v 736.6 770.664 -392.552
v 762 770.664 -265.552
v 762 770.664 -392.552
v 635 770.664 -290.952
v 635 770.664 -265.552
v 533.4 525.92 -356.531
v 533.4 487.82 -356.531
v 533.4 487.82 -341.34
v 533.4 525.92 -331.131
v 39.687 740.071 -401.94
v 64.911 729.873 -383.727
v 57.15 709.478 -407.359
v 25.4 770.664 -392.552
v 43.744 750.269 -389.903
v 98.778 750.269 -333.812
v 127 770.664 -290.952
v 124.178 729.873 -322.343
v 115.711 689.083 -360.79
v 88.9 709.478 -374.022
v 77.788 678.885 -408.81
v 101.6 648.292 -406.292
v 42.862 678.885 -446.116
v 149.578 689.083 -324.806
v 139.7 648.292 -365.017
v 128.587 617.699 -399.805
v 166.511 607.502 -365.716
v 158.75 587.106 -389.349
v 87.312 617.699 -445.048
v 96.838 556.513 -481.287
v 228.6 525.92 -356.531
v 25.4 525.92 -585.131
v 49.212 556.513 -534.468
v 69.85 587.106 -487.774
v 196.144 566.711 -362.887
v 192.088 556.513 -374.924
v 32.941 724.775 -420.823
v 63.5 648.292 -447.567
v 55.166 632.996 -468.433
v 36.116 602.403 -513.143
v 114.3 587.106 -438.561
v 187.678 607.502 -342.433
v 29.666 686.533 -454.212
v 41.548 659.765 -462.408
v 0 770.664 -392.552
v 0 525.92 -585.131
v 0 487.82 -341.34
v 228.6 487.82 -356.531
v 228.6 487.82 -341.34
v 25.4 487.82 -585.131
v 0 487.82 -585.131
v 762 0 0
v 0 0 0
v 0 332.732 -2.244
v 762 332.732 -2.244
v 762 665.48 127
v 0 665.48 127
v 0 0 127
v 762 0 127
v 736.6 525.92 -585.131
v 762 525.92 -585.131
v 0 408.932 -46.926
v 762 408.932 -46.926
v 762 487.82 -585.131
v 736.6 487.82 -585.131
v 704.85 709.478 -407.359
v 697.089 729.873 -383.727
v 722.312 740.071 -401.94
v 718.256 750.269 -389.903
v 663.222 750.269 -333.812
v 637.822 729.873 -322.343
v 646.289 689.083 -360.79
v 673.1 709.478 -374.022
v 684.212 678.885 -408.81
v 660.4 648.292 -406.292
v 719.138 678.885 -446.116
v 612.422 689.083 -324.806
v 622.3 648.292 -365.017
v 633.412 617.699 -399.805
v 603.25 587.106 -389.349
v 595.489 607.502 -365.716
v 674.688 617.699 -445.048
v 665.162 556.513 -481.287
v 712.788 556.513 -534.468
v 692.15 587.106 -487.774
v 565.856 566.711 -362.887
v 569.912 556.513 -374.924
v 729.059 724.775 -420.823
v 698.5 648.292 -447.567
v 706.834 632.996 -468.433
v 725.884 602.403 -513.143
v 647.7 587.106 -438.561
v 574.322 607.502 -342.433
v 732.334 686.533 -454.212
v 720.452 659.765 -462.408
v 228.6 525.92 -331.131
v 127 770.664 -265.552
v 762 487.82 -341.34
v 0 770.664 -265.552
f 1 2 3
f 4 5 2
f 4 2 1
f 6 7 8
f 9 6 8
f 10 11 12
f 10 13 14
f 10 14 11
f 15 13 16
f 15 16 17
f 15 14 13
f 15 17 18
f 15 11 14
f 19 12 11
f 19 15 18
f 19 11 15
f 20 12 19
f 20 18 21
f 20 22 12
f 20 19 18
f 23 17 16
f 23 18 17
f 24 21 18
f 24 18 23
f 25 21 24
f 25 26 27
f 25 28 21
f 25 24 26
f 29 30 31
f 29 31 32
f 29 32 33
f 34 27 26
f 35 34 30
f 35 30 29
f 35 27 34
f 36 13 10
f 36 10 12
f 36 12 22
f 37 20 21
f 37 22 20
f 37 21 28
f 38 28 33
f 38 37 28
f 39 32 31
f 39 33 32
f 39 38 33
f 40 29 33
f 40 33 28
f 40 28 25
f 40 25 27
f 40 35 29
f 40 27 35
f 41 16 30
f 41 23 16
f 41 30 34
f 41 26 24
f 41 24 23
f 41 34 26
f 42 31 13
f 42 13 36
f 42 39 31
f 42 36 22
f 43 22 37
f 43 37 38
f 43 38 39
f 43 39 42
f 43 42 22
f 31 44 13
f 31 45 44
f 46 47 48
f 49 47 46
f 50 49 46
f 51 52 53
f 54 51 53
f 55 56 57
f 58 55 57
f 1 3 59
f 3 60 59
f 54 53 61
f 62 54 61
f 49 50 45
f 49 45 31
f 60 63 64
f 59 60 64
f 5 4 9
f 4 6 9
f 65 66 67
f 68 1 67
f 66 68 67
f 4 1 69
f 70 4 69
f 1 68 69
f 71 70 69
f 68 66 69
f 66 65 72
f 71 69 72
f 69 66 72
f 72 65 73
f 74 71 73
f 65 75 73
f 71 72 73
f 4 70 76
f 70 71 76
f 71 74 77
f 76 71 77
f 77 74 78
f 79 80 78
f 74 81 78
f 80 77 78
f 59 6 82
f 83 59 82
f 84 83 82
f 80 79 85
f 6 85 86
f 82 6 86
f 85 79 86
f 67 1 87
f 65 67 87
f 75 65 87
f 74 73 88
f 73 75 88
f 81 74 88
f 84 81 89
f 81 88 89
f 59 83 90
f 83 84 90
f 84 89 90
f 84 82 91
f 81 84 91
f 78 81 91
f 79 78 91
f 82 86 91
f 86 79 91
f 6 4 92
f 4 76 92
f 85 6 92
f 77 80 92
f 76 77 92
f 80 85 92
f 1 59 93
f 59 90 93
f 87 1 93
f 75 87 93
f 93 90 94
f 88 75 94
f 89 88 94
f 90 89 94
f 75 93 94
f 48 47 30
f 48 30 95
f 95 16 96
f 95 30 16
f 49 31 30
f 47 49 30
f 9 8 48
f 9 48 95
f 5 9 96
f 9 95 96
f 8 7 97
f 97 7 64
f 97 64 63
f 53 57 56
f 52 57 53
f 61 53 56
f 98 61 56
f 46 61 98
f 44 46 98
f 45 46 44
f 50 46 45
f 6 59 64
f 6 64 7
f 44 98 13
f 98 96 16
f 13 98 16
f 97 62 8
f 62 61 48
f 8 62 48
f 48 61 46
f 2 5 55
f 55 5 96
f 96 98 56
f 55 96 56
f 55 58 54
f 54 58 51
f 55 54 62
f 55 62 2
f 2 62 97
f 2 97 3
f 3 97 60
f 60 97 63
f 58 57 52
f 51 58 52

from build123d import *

# Parameters (mm, degrees)
BOSS_EXTRUDE1_DEPTH = 762
BOSS_EXTRUDE2_DEPTH = 38.1


with BuildPart() as part:
    # Sketch1 → Boss-Extrude1 (new body)
    with BuildSketch(Plane(origin=(0, 0, 0), x_dir=(0, 0, -1), z_dir=(1, 0, 0))):
        Polygon((46.92577301, 408.932434185), (341.339964863, 487.820479132), (265.552255804, 770.66405993), (-127, 665.48), (-127, 0), (0, 0), (2.243845254, 332.732434185), align=None)
    extrude(amount=BOSS_EXTRUDE1_DEPTH)

    # Sketch3 → Loft1 section 0
    with BuildSketch(Plane(origin=(0, 770.66405993, 0), x_dir=(1, 0, 0), z_dir=(0, 1, 0))):
        with BuildLine():
            Line((762, 265.552255804), (762, 392.552255804))
            Line((762, 392.552255804), (736.6, 392.552255804))
            Line((736.6, 392.552255804), (635, 290.952255804))
            Line((635, 290.952255804), (635, 265.552255804))
            Line((635, 265.552255804), (762, 265.552255804))
        make_face()
    # Sketch4 → Loft1 section 1
    with BuildSketch(Plane(origin=(0, 525.920479132, 0), x_dir=(1, 0, 0), z_dir=(0, 1, 0))):
        with BuildLine():
            Line((762, 331.131100631), (762, 585.131100631))
            Line((762, 585.131100631), (736.6, 585.131100631))
            Line((736.6, 585.131100631), (533.4, 356.531100631))
            Line((533.4, 356.531100631), (533.4, 331.131100631))
            Line((533.4, 331.131100631), (762, 331.131100631))
        make_face()
    loft1 = loft()

    # Sketch4<5> → Boss-Extrude2 (add)
    with BuildSketch(Plane(origin=(0, 525.920479132, 0), x_dir=(1, 0, 0), z_dir=(0, 1, 0))):
        Polygon((762, 331.131100631), (762, 585.131100631), (736.6, 585.131100631), (533.4, 356.531100631), (533.4, 331.131100631), align=None)
    boss_extrude2 = extrude(amount=-BOSS_EXTRUDE2_DEPTH)

    # Mirror1: Loft1, Boss-Extrude2 across plane
    add(loft1.mirror(Plane(origin=(381, 0, 0), x_dir=(0, 0, 1), z_dir=(1, 0, 0))))
    add(boss_extrude2.mirror(Plane(origin=(381, 0, 0), x_dir=(0, 0, 1), z_dir=(1, 0, 0))))


solid = part.part
